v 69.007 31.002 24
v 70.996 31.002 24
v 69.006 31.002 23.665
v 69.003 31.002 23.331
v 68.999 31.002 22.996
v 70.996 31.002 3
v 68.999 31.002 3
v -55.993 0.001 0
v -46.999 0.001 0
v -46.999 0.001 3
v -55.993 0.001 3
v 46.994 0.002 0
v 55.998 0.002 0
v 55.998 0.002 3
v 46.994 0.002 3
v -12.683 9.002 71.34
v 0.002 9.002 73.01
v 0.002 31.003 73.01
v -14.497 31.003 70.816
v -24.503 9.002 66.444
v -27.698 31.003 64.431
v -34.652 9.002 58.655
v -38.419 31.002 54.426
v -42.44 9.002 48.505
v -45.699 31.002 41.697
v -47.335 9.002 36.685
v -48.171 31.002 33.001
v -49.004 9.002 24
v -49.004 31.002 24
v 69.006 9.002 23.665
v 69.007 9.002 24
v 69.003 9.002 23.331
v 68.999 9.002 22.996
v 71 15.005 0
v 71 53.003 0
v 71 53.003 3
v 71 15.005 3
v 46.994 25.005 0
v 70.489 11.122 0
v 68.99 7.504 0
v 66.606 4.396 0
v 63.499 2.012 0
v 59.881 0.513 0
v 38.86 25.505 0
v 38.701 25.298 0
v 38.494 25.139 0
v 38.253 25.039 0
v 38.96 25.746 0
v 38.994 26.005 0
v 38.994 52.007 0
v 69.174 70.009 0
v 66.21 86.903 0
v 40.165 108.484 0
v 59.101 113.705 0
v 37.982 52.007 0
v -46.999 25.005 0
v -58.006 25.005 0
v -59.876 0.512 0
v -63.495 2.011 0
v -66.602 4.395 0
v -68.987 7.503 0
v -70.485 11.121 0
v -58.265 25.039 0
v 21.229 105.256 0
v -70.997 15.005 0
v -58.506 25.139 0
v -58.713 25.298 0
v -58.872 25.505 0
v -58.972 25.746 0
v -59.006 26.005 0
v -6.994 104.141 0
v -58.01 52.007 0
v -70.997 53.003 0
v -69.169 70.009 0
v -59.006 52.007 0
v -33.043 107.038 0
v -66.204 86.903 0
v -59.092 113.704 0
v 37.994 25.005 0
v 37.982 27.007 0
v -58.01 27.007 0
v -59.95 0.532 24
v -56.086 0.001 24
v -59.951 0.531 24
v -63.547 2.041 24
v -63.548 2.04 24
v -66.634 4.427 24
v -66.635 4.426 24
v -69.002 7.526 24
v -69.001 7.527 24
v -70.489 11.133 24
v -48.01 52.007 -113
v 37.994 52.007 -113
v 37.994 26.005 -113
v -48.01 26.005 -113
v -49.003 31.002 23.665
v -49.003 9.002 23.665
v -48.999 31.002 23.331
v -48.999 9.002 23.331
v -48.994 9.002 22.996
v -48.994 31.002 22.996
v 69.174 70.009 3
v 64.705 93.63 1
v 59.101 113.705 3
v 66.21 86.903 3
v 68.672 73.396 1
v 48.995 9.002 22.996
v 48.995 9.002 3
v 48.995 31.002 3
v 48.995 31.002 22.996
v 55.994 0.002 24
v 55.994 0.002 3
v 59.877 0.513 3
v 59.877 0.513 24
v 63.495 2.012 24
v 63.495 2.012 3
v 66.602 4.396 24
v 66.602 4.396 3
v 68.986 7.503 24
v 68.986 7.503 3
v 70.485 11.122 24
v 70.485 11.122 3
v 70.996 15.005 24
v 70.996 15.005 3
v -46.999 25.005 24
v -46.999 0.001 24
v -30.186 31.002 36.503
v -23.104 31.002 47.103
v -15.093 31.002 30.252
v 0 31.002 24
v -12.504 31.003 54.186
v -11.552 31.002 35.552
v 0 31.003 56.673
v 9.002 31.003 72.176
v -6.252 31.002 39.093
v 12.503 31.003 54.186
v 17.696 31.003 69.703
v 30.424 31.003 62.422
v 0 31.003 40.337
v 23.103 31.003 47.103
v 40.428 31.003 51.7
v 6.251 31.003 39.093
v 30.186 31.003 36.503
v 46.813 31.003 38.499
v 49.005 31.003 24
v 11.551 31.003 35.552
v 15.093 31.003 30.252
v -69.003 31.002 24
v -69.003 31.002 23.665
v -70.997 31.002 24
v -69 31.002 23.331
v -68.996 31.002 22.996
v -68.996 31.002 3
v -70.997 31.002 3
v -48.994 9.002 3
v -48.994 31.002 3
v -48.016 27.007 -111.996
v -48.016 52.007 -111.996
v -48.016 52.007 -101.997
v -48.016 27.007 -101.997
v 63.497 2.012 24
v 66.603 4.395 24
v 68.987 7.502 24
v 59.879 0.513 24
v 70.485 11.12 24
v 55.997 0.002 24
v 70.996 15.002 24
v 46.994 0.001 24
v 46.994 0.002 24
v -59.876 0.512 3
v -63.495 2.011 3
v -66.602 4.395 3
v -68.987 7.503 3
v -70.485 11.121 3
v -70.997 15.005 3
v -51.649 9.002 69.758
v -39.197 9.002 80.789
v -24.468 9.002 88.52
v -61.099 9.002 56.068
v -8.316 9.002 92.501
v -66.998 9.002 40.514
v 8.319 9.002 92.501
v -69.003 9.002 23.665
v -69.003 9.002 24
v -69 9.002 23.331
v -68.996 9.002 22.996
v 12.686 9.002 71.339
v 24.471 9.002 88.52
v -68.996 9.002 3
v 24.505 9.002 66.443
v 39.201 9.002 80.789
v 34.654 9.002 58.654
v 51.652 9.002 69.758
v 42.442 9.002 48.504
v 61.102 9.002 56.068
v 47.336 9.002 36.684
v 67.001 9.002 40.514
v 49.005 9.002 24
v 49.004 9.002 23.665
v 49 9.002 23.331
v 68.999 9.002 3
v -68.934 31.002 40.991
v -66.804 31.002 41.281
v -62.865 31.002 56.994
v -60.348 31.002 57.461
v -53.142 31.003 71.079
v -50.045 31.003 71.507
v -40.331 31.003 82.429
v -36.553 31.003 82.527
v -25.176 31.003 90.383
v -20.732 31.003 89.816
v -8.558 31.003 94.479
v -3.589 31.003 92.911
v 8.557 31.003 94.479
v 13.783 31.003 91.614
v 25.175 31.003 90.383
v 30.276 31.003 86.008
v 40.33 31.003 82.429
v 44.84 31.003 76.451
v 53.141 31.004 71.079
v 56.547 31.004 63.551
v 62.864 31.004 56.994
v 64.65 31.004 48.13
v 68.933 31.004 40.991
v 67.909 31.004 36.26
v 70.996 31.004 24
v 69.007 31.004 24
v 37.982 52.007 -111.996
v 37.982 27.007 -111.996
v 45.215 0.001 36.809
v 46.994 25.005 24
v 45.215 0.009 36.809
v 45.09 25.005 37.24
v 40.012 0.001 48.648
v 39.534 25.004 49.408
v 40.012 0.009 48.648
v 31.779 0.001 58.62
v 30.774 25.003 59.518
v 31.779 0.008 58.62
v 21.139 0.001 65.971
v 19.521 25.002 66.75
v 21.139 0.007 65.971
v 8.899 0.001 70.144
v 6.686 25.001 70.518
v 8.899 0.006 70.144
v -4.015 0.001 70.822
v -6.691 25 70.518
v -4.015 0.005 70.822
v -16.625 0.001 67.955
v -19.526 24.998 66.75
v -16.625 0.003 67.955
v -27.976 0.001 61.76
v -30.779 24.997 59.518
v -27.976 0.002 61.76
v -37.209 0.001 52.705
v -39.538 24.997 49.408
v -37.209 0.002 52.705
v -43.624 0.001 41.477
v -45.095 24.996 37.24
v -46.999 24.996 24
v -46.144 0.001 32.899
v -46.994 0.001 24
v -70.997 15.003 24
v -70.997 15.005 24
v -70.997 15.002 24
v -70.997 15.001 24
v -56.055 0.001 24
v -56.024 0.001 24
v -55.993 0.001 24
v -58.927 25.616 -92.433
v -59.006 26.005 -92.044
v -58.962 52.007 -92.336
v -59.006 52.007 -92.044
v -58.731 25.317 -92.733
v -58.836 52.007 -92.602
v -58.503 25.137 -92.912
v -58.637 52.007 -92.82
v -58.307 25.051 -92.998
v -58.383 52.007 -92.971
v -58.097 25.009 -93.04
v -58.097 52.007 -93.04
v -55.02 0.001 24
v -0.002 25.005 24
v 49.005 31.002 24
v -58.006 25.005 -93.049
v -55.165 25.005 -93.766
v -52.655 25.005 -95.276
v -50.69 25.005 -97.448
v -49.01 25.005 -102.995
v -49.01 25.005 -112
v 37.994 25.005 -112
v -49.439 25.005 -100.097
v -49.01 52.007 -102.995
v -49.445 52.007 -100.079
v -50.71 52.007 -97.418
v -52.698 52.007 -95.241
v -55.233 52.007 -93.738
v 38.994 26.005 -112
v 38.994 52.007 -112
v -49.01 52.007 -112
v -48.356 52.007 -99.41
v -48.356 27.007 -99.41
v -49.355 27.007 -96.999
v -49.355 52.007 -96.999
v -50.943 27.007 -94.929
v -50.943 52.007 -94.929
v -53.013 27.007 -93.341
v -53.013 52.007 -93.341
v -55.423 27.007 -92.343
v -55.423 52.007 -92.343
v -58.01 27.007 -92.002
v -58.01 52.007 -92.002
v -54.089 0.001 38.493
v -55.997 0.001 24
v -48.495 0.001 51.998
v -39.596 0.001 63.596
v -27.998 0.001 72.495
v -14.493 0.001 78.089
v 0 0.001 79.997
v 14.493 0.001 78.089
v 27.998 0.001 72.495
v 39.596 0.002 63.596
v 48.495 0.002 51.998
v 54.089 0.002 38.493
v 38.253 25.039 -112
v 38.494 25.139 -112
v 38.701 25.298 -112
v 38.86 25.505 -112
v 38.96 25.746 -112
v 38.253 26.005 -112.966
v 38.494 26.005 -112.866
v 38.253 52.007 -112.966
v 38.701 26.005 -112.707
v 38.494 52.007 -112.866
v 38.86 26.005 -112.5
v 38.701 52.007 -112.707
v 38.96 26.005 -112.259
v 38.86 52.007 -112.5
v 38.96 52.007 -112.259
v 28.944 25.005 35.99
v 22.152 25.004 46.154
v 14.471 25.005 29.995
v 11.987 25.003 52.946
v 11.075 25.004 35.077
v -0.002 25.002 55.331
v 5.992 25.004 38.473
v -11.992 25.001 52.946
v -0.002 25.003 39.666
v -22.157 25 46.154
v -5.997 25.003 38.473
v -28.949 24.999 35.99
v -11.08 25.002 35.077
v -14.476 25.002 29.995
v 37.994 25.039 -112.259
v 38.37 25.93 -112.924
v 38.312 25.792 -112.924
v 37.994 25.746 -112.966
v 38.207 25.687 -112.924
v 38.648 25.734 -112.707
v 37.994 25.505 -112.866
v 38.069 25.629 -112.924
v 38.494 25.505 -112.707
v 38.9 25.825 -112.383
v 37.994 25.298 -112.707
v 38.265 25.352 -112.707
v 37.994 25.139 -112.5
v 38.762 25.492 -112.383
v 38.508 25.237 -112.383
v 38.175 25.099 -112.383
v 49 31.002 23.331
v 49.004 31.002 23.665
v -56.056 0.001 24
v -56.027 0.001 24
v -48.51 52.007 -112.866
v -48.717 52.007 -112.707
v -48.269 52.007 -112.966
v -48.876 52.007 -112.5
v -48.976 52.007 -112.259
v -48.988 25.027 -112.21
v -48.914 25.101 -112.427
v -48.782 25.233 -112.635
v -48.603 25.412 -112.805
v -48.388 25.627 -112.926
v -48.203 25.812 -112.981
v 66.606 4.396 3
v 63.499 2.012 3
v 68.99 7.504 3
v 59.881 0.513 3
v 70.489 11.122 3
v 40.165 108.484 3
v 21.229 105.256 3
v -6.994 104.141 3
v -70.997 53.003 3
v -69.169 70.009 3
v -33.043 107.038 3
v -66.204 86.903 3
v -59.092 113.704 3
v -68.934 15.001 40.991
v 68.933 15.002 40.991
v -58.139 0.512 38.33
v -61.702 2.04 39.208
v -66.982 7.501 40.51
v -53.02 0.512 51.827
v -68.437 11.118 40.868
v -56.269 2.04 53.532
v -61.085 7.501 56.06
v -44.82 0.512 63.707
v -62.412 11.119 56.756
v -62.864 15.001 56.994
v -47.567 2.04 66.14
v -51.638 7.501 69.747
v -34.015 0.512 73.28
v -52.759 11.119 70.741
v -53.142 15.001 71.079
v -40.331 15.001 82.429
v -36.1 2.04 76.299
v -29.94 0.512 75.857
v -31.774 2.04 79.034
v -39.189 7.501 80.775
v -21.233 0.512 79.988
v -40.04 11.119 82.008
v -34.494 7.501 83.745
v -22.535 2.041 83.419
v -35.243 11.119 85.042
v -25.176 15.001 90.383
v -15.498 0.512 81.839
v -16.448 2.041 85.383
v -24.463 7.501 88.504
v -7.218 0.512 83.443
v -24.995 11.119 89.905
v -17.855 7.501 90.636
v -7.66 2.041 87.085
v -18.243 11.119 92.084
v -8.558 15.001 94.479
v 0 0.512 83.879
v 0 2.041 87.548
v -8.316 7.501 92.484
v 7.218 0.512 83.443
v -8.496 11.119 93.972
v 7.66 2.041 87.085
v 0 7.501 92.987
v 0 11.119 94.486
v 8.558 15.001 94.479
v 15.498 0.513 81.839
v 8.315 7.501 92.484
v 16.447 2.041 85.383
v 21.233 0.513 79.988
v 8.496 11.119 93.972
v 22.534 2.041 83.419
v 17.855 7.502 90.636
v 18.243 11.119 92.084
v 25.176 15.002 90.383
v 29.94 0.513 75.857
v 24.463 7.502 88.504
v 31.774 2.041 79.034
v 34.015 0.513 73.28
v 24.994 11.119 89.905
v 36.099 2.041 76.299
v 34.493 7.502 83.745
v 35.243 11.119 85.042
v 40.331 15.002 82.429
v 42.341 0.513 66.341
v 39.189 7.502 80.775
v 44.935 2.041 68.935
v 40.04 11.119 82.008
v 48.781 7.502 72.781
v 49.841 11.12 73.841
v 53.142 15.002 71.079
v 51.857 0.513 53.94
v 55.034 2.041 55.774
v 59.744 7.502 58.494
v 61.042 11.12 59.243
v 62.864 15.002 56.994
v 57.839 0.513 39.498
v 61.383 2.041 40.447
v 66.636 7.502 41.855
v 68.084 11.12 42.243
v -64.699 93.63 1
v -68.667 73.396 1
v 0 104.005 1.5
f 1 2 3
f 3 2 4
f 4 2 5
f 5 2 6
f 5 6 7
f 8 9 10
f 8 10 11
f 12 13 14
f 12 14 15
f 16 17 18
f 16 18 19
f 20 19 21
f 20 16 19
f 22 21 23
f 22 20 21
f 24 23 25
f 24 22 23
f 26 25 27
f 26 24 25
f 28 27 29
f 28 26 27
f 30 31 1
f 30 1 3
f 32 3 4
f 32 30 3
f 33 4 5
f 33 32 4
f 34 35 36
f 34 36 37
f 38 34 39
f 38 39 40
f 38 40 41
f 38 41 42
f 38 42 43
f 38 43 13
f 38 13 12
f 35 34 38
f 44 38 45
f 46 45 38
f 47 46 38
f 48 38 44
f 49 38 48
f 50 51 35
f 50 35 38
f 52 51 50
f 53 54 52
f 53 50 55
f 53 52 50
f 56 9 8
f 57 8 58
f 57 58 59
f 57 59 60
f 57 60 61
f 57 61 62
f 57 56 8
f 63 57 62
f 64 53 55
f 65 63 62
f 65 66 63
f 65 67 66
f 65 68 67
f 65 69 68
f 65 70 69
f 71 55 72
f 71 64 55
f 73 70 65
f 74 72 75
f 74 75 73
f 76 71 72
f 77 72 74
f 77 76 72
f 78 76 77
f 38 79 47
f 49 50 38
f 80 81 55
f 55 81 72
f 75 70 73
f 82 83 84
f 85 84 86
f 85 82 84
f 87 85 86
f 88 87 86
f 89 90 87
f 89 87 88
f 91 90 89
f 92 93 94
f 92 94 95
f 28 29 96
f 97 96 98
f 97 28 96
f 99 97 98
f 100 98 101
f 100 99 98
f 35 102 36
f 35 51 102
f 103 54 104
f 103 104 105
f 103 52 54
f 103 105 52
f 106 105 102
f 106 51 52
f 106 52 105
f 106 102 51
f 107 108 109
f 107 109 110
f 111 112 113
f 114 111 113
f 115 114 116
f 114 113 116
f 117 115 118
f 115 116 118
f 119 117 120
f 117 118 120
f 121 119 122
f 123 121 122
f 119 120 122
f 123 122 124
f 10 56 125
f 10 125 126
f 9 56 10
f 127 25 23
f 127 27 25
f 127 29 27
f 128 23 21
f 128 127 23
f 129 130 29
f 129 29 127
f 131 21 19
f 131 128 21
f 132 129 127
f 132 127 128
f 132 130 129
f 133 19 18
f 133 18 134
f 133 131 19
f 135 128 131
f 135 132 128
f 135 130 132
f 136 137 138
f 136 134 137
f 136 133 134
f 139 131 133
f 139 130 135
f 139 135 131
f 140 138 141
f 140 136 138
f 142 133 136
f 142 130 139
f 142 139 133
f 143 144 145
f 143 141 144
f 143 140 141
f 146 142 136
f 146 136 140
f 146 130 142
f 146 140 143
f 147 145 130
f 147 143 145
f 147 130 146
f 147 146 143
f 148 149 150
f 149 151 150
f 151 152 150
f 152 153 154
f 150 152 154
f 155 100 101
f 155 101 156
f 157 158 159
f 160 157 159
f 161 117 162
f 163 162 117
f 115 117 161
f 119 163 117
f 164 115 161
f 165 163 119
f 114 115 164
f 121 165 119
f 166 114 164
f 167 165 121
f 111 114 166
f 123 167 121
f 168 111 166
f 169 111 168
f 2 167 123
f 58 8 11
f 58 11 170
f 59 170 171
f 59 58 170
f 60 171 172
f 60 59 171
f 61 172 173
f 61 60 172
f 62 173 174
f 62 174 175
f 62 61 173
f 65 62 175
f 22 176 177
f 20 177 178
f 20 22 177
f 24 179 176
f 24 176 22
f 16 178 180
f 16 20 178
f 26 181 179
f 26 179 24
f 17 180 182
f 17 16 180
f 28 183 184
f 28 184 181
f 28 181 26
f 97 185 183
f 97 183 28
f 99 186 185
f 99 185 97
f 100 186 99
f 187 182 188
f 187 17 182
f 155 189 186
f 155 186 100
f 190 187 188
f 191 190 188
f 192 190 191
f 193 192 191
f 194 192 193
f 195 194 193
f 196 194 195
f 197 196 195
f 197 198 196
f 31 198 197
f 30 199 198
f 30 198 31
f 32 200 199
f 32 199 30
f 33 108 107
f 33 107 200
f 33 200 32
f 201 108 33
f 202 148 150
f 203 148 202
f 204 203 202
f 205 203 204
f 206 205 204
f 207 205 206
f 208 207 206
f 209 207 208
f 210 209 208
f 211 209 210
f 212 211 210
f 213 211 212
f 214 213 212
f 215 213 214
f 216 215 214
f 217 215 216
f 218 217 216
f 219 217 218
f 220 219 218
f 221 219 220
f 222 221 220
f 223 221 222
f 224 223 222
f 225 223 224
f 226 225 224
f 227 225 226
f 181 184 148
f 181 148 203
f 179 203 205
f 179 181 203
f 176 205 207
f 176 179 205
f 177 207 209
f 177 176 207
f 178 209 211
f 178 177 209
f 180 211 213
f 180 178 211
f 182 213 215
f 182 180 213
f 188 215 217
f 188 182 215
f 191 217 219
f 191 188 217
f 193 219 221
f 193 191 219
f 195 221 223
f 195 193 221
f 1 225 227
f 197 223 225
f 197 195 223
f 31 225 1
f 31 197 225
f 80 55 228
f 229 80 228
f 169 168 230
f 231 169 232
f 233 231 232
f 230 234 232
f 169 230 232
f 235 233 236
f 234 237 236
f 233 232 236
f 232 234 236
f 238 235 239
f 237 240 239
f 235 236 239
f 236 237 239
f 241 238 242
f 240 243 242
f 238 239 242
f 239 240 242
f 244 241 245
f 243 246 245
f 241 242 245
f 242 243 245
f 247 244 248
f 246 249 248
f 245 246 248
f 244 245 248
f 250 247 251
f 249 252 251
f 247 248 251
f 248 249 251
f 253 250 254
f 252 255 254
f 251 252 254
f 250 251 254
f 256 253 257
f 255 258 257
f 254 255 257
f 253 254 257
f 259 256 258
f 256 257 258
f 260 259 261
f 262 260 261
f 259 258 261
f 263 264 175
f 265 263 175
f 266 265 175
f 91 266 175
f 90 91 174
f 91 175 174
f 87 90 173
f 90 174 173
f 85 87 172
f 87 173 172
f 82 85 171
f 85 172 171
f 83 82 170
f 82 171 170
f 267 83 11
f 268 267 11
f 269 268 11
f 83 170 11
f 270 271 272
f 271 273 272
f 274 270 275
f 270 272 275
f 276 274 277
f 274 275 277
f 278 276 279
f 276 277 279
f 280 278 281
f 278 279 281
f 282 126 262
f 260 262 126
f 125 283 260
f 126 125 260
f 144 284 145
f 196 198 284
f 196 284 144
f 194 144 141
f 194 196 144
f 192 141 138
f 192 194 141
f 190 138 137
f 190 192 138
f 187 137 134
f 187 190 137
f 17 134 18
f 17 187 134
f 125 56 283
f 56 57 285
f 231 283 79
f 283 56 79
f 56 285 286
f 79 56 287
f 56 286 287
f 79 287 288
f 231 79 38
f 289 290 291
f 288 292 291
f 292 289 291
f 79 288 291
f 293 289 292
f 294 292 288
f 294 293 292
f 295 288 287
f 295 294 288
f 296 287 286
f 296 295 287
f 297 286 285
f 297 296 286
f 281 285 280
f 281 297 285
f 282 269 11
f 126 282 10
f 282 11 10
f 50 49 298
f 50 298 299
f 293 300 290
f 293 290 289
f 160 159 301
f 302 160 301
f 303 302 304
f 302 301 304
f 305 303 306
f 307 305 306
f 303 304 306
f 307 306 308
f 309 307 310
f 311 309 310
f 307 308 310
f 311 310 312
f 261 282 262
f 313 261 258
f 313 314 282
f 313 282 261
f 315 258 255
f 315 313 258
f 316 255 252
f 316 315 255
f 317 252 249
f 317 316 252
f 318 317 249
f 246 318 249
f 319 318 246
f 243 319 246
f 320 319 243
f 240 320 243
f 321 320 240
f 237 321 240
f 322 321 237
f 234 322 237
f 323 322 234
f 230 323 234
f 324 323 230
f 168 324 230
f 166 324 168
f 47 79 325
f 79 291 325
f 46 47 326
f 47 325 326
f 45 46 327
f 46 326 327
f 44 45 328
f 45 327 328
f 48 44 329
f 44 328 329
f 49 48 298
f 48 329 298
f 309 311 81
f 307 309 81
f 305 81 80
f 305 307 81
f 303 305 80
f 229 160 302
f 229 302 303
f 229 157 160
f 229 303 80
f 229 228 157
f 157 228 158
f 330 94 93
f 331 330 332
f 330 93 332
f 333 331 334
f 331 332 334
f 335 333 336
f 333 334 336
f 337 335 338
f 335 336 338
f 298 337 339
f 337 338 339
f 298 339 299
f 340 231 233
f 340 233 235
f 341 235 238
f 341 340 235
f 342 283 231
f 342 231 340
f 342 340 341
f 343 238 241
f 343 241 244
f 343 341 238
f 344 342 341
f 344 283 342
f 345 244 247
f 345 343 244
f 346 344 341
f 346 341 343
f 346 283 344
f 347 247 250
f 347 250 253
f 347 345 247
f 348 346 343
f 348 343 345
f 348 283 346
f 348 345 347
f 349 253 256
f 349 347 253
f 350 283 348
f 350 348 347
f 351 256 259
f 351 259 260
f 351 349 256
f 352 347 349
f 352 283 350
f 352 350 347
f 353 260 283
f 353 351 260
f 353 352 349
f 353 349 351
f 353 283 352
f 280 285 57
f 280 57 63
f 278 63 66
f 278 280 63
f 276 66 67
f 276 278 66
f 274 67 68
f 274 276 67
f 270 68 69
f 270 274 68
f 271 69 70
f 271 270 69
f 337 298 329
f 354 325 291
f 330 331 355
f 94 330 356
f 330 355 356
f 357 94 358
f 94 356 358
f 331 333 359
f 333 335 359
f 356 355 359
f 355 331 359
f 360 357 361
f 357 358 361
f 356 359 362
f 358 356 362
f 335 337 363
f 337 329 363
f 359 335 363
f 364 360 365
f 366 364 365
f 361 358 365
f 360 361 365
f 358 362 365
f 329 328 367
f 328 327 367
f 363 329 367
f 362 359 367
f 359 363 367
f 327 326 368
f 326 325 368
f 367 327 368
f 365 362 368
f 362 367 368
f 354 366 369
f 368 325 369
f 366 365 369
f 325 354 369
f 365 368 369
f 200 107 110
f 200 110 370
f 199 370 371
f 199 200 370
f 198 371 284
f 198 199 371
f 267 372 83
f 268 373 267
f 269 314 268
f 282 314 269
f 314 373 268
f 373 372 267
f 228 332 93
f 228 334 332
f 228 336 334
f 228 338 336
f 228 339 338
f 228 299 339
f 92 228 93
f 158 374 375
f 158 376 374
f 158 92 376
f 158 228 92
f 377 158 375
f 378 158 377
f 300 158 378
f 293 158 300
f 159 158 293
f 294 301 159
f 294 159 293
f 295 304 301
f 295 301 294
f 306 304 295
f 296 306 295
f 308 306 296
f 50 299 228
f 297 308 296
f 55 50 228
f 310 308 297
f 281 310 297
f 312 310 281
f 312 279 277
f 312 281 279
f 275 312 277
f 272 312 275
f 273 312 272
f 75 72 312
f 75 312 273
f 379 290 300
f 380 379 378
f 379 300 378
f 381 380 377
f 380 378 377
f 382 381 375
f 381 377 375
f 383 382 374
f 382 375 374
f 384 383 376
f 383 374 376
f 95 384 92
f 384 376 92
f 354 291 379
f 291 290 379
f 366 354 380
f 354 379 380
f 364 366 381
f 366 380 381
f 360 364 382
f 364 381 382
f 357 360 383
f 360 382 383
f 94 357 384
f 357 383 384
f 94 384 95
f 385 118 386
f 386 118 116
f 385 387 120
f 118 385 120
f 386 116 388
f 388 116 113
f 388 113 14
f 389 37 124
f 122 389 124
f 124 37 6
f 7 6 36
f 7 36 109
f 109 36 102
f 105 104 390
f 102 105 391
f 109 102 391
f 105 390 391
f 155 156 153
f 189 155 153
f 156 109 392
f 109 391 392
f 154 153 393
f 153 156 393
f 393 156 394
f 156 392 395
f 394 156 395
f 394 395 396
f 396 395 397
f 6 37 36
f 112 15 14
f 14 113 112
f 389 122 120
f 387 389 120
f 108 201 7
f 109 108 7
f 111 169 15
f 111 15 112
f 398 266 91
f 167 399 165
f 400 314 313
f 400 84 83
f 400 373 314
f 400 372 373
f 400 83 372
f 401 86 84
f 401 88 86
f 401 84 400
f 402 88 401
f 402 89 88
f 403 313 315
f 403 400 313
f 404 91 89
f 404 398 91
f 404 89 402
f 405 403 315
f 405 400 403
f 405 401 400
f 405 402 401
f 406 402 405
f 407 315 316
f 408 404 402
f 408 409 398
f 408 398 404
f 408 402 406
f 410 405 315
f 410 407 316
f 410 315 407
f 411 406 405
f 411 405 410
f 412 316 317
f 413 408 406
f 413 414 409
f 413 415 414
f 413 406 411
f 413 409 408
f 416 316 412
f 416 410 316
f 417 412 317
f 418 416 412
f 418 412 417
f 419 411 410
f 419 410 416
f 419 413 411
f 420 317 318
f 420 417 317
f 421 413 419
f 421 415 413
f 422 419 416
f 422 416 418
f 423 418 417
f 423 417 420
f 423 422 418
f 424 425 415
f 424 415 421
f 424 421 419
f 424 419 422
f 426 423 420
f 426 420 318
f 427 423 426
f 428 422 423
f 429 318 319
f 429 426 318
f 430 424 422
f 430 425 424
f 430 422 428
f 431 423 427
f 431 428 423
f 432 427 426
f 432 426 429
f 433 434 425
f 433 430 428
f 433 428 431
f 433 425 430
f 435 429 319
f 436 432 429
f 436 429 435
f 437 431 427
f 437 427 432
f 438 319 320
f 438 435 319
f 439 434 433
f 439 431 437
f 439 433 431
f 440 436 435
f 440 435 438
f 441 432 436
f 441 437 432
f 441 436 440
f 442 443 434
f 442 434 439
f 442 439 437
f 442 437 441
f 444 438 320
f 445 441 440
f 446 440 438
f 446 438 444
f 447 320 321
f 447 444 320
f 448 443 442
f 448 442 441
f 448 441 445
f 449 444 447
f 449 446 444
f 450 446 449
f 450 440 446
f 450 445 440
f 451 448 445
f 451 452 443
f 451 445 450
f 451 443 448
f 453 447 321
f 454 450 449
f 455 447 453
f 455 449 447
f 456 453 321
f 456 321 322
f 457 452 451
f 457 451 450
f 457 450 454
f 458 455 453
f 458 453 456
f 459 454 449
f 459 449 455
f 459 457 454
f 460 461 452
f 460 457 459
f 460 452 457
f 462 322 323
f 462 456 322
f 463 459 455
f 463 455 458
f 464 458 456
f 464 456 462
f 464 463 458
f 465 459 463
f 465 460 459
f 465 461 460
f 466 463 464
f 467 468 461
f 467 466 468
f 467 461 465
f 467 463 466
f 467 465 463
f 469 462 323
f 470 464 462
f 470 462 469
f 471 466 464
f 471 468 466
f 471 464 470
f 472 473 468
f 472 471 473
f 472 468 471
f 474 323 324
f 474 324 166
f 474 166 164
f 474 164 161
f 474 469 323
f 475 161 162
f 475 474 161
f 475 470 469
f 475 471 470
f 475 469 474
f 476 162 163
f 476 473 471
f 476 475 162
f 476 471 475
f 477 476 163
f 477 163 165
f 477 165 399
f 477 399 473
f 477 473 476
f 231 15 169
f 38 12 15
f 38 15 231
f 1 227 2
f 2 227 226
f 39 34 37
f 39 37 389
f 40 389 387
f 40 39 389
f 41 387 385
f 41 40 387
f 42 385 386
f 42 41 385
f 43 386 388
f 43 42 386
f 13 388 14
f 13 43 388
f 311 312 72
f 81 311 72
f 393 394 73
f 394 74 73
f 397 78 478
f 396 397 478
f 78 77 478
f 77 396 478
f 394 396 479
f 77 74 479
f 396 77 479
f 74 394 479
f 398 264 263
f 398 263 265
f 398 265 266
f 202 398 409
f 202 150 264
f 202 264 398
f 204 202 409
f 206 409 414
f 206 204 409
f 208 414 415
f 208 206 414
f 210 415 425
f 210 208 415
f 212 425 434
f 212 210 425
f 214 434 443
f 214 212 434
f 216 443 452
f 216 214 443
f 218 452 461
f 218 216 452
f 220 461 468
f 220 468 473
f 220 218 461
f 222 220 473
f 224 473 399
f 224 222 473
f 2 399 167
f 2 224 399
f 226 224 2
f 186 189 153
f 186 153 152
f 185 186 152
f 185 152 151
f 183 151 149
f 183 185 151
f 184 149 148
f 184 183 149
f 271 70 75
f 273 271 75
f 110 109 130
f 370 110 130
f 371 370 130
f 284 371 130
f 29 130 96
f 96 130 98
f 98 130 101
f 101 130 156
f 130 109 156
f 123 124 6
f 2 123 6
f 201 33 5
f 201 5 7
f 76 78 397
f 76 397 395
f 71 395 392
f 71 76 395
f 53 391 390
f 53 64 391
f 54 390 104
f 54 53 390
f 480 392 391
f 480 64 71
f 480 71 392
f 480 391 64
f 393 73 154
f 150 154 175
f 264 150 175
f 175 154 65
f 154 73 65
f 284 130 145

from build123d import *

# Parameters (mm, degrees)
BOSS_EXTRUDE2_DEPTH      = 3
SKETCH14_W               = 98
SKETCH14_H               = 27.00264841
BOSS_EXTRUDE4_DEPTH      = 113
CUT_EXTRUDE11_DEPTH      = 25
BOSS_EXTRUDE5_DEPTH      = 21
REVOLVE1_ANGLE           = 180
CUT_EXTRUDE15_DEPTH      = 1
CUT_EXTRUDE15_DEPTH_BACK = 22
CUT_EXTRUDE14_DEPTH      = 24
CUT_REVOLVE2_ANGLE       = 180
CUT_EXTRUDE16_DEPTH      = 30
FILLET1_R                = 1


# Read off the part's stored shape, not the designer's step: Boss-Extrude5
with BuildPart() as part:
    # Sketch1 → Boss-Extrude2 (new body)
    with BuildSketch(Plane.XY):
        with BuildLine():
            Line((0, 0), (-55.99287927, 0.000657501))
            ThreePointArc((-55.99287927, 0.000657501), (-66.60214284, 4.395231334), (-70.996716676, 15.00467109))
            Line((-70.996716676, 15.00467109), (-70.996716676, 53.003088443))
            add(Edge.make_bspline(
                [(-59.092437552, 113.703738569), (-65.518680916, 93.709690833), (-69.486773958, 73.476140791), (-70.996716676, 53.003088443)],
                knots=[0.003076868, 0.003076868, 0.003076868, 0.003076868, 0.620649816, 0.620649816, 0.620649816, 0.620649816], degree=3))
            add(Edge.make_bspline(
                [(-59.092437552, 113.703738569), (-39.394984135, 107.237929235), (0.002749603, 100.771350363), (39.400586429, 107.237584193), (59.100918302, 113.704587579)],
                knots=[0.007529078, 0.007529078, 0.007529078, 0.007529078, 0.499976084, 0.992492475, 0.992492475, 0.992492475, 0.992492475], degree=3))
            add(Edge.make_bspline(
                [(59.100918302, 113.704587579), (65.524413648, 93.710040003), (69.490811091, 73.476198601), (71.000110633, 53.003063374)],
                knots=[0.003067815, 0.003067815, 0.003067815, 0.003067815, 0.620645861, 0.620645861, 0.620645861, 0.620645861], degree=3))
            Line((71.000110633, 53.003063374), (71.000110633, 15.004646021))
            ThreePointArc((71.000110633, 15.004646021), (66.605957202, 4.396221214), (55.998086385, 0.002067804))
            Line((55.998086385, 0.002067804), (0, 0))
        make_face()
    extrude(amount=BOSS_EXTRUDE2_DEPTH)

    # Sketch14 → Boss-Extrude4 (add)
    with BuildSketch(Plane(origin=(0, 0, 0), x_dir=(-1, 0, 0), z_dir=(0, 0, -1))):
        with Locations((10.005711619, 38.506146673)):
            Rectangle(SKETCH14_W, SKETCH14_H)
    extrude(amount=BOSS_EXTRUDE4_DEPTH)

    # Sketch17 → Cut-Extrude11 (cut)
    with BuildSketch(Plane(origin=(0, 52.007470878, 0), x_dir=(1, 0, 0), z_dir=(0, 1, 0))):
        with BuildLine():
            Line((-48.015549057, 109.013130471), (-48.015549057, 101.996525982))
            ThreePointArc((-48.015549057, 101.996525982), (-50.942812726, 94.929486331), (-58.009852377, 92.002222662))
            Line((-58.009852377, 92.002222662), (-58.009852377, 89.000786475))
            Line((-58.009852377, 89.000786475), (-58.009852377, 0))
            Line((-58.009852377, 0), (37.981980496, 0))
            Line((37.981980496, 0), (37.981980496, 111.996441685))
            Line((37.981980496, 111.996441685), (-48.015549057, 111.996441685))
            Line((-48.015549057, 111.996441685), (-48.015549057, 109.013130471))
        make_face()
    extrude(amount=-CUT_EXTRUDE11_DEPTH, mode=Mode.SUBTRACT)

    # Boss-Extrude5 outline → Boss-Extrude5 (add)
    with BuildSketch(Plane.XY.offset(3)):
        with BuildLine():
            Line((70.996140169, 31.00236483), (-70.996716676, 31.00236483))
            Line((-70.996716676, 31.00236483), (-70.996716676, 15.00467109))
            ThreePointArc((-70.996716676, 15.00467109), (-66.602205131, 4.395293626), (-55.99287927, 0.0006575))
            Line((-55.99287927, 0.0006575), (55.993738248, 0.002091992))
            ThreePointArc((55.993738248, 0.002091992), (66.60204984, 4.396315904), (70.996140169, 15.004682829))
            Line((70.996140169, 15.004682829), (70.996140169, 31.00236483))
        make_face()
    extrude(amount=BOSS_EXTRUDE5_DEPTH)

    # Sketch23 → Revolve1 (revolve)
    with BuildSketch(Plane.XY.offset(24)):
        with BuildLine():
            Line((-0.000288253, 31.00236483), (0, 0))
            Line((0, 0), (-55.996899325, 0.000681852))
            ThreePointArc((-55.996899325, 0.000681852), (-66.603382969, 4.39414471), (-70.996716676, 15.000681851))
            Line((-70.996716676, 15.000681851), (-70.996716676, 15.00467109))
            Line((-70.996716676, 15.00467109), (-70.996716676, 31.00236483))
            Line((-70.996716676, 31.00236483), (-0.000288253, 31.00236483))
        make_face()
    revolve(axis=Axis((-0.000288253, 31.00236483, 24), (-9.297785566939823e-06, 0.9999999999567756, 0)), revolution_arc=REVOLVE1_ANGLE)

    # Sketch24 → Cut-Extrude15 (cut, two sides: drawn at the far end of the back side and taken through both)
    with BuildSketch(Plane(origin=(0, 31.00236483, 0), x_dir=(1, 0, 0), z_dir=(0, 1, 0)).offset(-CUT_EXTRUDE15_DEPTH_BACK)):
        with BuildLine():
            Line((68.999389406, -3), (48.994713166, -3))
            Line((48.994713166, -3), (48.994713166, -22.995821368))
            ThreePointArc((48.994713166, -22.995821368), (49.002483122, -23.497884055), (49.005108381, -24))
            Line((49.005108381, -24), (69.006686122, -24))
            ThreePointArc((69.006686122, -24), (69.004864469, -23.497897411), (68.999389406, -22.995821368))
            Line((68.999389406, -22.995821368), (68.999389406, -3))
        make_face()
        with BuildLine():
            Line((-49.004079193, -24), (-69.003422409, -24))
            ThreePointArc((-69.003422409, -24), (0.001631857, -93.004353523), (69.006686122, -24))
            Line((69.006686122, -24), (49.005108381, -24))
            ThreePointArc((49.005108381, -24), (34.65421123, -58.654415118), (0.001631857, -73.009744406))
            ThreePointArc((0.001631857, -73.009744406), (-34.65239206, -58.655205184), (-49.004079193, -24))
        make_face()
        with BuildLine():
            Line((-48.993683978, -3), (-68.996125693, -3))
            Line((-68.996125693, -3), (-68.996125693, -22.995821368))
            ThreePointArc((-68.996125693, -22.995821368), (-69.001600755, -23.497897411), (-69.003422409, -24))
            Line((-69.003422409, -24), (-49.004079193, -24))
            ThreePointArc((-49.004079193, -24), (-49.001453934, -23.497884055), (-48.993683978, -22.995821368))
            Line((-48.993683978, -22.995821368), (-48.993683978, -3))
        make_face()
    extrude(amount=CUT_EXTRUDE15_DEPTH + CUT_EXTRUDE15_DEPTH_BACK, mode=Mode.SUBTRACT)

    # Sketch21 → Cut-Extrude14 (cut)
    with BuildSketch(Plane(origin=(0, 0, 0), x_dir=(-1, 0, 0), z_dir=(0, 0, -1))):
        Polygon((-46.994052442, 0.001735318), (-46.994052442, 25.004822468), (0, 25.004822468), (46.999021514, 25.004822468), (46.999021514, 0.000551889), (0, 0), align=None)
    extrude(amount=-CUT_EXTRUDE14_DEPTH, mode=Mode.SUBTRACT)

    # Sketch26 → Cut-Revolve2 (revolve, cut)
    with BuildSketch(Plane(origin=(0, 0, 24), x_dir=(-1, 0, 0), z_dir=(0, 0, -1))):
        Polygon((-46.994052442, 25.004822468), (0.002484536, 25.004822468), (0, -0.975536805), (-46.994052442, -0.975536805), (-46.994052442, 0.001735318), align=None)
    revolve(axis=Axis((0, -0.975536805, 24), (9.56313097373021e-05, -0.9999999954273263, 0)), revolution_arc=CUT_REVOLVE2_ANGLE, mode=Mode.SUBTRACT)

    # Sketch27 → Cut-Extrude16 (cut)
    with BuildSketch(Plane(origin=(0, 52.007470878, 0), x_dir=(1, 0, 0), z_dir=(0, 1, 0))):
        with BuildLine():
            Line((-49.010012163, 113), (-49.010012163, 102.994608886))
            ThreePointArc((-49.010012163, 102.994608886), (-66.073738487, 95.926582018), (-59.005711619, 112.990308342))
            Line((-59.005711619, 112.990308342), (-59.005711619, 113.493786648))
            Line((-59.005711619, 113.493786648), (-49.010012163, 113.493786648))
            Line((-49.010012163, 113.493786648), (-49.010012163, 113))
        make_face()
    extrude(amount=-CUT_EXTRUDE16_DEPTH, mode=Mode.SUBTRACT)

    # Fillet1
    fillet1_edges = [part.edges().sort_by_distance(p)[0] for p in [
        (-49.010012163, 38.506146673, -113),
        (-59.005711619, 25.004822468, -46.499454715),
        (-59.005711619, 38.506146673, -92.99890943),
        (38.994288381, 25.004822468, -56.5),
        (38.994288381, 38.506146673, -113),
        (-5.007861891, 25.004822468, -113),
    ]]
    fillet(fillet1_edges, radius=FILLET1_R)


solid = part.part
